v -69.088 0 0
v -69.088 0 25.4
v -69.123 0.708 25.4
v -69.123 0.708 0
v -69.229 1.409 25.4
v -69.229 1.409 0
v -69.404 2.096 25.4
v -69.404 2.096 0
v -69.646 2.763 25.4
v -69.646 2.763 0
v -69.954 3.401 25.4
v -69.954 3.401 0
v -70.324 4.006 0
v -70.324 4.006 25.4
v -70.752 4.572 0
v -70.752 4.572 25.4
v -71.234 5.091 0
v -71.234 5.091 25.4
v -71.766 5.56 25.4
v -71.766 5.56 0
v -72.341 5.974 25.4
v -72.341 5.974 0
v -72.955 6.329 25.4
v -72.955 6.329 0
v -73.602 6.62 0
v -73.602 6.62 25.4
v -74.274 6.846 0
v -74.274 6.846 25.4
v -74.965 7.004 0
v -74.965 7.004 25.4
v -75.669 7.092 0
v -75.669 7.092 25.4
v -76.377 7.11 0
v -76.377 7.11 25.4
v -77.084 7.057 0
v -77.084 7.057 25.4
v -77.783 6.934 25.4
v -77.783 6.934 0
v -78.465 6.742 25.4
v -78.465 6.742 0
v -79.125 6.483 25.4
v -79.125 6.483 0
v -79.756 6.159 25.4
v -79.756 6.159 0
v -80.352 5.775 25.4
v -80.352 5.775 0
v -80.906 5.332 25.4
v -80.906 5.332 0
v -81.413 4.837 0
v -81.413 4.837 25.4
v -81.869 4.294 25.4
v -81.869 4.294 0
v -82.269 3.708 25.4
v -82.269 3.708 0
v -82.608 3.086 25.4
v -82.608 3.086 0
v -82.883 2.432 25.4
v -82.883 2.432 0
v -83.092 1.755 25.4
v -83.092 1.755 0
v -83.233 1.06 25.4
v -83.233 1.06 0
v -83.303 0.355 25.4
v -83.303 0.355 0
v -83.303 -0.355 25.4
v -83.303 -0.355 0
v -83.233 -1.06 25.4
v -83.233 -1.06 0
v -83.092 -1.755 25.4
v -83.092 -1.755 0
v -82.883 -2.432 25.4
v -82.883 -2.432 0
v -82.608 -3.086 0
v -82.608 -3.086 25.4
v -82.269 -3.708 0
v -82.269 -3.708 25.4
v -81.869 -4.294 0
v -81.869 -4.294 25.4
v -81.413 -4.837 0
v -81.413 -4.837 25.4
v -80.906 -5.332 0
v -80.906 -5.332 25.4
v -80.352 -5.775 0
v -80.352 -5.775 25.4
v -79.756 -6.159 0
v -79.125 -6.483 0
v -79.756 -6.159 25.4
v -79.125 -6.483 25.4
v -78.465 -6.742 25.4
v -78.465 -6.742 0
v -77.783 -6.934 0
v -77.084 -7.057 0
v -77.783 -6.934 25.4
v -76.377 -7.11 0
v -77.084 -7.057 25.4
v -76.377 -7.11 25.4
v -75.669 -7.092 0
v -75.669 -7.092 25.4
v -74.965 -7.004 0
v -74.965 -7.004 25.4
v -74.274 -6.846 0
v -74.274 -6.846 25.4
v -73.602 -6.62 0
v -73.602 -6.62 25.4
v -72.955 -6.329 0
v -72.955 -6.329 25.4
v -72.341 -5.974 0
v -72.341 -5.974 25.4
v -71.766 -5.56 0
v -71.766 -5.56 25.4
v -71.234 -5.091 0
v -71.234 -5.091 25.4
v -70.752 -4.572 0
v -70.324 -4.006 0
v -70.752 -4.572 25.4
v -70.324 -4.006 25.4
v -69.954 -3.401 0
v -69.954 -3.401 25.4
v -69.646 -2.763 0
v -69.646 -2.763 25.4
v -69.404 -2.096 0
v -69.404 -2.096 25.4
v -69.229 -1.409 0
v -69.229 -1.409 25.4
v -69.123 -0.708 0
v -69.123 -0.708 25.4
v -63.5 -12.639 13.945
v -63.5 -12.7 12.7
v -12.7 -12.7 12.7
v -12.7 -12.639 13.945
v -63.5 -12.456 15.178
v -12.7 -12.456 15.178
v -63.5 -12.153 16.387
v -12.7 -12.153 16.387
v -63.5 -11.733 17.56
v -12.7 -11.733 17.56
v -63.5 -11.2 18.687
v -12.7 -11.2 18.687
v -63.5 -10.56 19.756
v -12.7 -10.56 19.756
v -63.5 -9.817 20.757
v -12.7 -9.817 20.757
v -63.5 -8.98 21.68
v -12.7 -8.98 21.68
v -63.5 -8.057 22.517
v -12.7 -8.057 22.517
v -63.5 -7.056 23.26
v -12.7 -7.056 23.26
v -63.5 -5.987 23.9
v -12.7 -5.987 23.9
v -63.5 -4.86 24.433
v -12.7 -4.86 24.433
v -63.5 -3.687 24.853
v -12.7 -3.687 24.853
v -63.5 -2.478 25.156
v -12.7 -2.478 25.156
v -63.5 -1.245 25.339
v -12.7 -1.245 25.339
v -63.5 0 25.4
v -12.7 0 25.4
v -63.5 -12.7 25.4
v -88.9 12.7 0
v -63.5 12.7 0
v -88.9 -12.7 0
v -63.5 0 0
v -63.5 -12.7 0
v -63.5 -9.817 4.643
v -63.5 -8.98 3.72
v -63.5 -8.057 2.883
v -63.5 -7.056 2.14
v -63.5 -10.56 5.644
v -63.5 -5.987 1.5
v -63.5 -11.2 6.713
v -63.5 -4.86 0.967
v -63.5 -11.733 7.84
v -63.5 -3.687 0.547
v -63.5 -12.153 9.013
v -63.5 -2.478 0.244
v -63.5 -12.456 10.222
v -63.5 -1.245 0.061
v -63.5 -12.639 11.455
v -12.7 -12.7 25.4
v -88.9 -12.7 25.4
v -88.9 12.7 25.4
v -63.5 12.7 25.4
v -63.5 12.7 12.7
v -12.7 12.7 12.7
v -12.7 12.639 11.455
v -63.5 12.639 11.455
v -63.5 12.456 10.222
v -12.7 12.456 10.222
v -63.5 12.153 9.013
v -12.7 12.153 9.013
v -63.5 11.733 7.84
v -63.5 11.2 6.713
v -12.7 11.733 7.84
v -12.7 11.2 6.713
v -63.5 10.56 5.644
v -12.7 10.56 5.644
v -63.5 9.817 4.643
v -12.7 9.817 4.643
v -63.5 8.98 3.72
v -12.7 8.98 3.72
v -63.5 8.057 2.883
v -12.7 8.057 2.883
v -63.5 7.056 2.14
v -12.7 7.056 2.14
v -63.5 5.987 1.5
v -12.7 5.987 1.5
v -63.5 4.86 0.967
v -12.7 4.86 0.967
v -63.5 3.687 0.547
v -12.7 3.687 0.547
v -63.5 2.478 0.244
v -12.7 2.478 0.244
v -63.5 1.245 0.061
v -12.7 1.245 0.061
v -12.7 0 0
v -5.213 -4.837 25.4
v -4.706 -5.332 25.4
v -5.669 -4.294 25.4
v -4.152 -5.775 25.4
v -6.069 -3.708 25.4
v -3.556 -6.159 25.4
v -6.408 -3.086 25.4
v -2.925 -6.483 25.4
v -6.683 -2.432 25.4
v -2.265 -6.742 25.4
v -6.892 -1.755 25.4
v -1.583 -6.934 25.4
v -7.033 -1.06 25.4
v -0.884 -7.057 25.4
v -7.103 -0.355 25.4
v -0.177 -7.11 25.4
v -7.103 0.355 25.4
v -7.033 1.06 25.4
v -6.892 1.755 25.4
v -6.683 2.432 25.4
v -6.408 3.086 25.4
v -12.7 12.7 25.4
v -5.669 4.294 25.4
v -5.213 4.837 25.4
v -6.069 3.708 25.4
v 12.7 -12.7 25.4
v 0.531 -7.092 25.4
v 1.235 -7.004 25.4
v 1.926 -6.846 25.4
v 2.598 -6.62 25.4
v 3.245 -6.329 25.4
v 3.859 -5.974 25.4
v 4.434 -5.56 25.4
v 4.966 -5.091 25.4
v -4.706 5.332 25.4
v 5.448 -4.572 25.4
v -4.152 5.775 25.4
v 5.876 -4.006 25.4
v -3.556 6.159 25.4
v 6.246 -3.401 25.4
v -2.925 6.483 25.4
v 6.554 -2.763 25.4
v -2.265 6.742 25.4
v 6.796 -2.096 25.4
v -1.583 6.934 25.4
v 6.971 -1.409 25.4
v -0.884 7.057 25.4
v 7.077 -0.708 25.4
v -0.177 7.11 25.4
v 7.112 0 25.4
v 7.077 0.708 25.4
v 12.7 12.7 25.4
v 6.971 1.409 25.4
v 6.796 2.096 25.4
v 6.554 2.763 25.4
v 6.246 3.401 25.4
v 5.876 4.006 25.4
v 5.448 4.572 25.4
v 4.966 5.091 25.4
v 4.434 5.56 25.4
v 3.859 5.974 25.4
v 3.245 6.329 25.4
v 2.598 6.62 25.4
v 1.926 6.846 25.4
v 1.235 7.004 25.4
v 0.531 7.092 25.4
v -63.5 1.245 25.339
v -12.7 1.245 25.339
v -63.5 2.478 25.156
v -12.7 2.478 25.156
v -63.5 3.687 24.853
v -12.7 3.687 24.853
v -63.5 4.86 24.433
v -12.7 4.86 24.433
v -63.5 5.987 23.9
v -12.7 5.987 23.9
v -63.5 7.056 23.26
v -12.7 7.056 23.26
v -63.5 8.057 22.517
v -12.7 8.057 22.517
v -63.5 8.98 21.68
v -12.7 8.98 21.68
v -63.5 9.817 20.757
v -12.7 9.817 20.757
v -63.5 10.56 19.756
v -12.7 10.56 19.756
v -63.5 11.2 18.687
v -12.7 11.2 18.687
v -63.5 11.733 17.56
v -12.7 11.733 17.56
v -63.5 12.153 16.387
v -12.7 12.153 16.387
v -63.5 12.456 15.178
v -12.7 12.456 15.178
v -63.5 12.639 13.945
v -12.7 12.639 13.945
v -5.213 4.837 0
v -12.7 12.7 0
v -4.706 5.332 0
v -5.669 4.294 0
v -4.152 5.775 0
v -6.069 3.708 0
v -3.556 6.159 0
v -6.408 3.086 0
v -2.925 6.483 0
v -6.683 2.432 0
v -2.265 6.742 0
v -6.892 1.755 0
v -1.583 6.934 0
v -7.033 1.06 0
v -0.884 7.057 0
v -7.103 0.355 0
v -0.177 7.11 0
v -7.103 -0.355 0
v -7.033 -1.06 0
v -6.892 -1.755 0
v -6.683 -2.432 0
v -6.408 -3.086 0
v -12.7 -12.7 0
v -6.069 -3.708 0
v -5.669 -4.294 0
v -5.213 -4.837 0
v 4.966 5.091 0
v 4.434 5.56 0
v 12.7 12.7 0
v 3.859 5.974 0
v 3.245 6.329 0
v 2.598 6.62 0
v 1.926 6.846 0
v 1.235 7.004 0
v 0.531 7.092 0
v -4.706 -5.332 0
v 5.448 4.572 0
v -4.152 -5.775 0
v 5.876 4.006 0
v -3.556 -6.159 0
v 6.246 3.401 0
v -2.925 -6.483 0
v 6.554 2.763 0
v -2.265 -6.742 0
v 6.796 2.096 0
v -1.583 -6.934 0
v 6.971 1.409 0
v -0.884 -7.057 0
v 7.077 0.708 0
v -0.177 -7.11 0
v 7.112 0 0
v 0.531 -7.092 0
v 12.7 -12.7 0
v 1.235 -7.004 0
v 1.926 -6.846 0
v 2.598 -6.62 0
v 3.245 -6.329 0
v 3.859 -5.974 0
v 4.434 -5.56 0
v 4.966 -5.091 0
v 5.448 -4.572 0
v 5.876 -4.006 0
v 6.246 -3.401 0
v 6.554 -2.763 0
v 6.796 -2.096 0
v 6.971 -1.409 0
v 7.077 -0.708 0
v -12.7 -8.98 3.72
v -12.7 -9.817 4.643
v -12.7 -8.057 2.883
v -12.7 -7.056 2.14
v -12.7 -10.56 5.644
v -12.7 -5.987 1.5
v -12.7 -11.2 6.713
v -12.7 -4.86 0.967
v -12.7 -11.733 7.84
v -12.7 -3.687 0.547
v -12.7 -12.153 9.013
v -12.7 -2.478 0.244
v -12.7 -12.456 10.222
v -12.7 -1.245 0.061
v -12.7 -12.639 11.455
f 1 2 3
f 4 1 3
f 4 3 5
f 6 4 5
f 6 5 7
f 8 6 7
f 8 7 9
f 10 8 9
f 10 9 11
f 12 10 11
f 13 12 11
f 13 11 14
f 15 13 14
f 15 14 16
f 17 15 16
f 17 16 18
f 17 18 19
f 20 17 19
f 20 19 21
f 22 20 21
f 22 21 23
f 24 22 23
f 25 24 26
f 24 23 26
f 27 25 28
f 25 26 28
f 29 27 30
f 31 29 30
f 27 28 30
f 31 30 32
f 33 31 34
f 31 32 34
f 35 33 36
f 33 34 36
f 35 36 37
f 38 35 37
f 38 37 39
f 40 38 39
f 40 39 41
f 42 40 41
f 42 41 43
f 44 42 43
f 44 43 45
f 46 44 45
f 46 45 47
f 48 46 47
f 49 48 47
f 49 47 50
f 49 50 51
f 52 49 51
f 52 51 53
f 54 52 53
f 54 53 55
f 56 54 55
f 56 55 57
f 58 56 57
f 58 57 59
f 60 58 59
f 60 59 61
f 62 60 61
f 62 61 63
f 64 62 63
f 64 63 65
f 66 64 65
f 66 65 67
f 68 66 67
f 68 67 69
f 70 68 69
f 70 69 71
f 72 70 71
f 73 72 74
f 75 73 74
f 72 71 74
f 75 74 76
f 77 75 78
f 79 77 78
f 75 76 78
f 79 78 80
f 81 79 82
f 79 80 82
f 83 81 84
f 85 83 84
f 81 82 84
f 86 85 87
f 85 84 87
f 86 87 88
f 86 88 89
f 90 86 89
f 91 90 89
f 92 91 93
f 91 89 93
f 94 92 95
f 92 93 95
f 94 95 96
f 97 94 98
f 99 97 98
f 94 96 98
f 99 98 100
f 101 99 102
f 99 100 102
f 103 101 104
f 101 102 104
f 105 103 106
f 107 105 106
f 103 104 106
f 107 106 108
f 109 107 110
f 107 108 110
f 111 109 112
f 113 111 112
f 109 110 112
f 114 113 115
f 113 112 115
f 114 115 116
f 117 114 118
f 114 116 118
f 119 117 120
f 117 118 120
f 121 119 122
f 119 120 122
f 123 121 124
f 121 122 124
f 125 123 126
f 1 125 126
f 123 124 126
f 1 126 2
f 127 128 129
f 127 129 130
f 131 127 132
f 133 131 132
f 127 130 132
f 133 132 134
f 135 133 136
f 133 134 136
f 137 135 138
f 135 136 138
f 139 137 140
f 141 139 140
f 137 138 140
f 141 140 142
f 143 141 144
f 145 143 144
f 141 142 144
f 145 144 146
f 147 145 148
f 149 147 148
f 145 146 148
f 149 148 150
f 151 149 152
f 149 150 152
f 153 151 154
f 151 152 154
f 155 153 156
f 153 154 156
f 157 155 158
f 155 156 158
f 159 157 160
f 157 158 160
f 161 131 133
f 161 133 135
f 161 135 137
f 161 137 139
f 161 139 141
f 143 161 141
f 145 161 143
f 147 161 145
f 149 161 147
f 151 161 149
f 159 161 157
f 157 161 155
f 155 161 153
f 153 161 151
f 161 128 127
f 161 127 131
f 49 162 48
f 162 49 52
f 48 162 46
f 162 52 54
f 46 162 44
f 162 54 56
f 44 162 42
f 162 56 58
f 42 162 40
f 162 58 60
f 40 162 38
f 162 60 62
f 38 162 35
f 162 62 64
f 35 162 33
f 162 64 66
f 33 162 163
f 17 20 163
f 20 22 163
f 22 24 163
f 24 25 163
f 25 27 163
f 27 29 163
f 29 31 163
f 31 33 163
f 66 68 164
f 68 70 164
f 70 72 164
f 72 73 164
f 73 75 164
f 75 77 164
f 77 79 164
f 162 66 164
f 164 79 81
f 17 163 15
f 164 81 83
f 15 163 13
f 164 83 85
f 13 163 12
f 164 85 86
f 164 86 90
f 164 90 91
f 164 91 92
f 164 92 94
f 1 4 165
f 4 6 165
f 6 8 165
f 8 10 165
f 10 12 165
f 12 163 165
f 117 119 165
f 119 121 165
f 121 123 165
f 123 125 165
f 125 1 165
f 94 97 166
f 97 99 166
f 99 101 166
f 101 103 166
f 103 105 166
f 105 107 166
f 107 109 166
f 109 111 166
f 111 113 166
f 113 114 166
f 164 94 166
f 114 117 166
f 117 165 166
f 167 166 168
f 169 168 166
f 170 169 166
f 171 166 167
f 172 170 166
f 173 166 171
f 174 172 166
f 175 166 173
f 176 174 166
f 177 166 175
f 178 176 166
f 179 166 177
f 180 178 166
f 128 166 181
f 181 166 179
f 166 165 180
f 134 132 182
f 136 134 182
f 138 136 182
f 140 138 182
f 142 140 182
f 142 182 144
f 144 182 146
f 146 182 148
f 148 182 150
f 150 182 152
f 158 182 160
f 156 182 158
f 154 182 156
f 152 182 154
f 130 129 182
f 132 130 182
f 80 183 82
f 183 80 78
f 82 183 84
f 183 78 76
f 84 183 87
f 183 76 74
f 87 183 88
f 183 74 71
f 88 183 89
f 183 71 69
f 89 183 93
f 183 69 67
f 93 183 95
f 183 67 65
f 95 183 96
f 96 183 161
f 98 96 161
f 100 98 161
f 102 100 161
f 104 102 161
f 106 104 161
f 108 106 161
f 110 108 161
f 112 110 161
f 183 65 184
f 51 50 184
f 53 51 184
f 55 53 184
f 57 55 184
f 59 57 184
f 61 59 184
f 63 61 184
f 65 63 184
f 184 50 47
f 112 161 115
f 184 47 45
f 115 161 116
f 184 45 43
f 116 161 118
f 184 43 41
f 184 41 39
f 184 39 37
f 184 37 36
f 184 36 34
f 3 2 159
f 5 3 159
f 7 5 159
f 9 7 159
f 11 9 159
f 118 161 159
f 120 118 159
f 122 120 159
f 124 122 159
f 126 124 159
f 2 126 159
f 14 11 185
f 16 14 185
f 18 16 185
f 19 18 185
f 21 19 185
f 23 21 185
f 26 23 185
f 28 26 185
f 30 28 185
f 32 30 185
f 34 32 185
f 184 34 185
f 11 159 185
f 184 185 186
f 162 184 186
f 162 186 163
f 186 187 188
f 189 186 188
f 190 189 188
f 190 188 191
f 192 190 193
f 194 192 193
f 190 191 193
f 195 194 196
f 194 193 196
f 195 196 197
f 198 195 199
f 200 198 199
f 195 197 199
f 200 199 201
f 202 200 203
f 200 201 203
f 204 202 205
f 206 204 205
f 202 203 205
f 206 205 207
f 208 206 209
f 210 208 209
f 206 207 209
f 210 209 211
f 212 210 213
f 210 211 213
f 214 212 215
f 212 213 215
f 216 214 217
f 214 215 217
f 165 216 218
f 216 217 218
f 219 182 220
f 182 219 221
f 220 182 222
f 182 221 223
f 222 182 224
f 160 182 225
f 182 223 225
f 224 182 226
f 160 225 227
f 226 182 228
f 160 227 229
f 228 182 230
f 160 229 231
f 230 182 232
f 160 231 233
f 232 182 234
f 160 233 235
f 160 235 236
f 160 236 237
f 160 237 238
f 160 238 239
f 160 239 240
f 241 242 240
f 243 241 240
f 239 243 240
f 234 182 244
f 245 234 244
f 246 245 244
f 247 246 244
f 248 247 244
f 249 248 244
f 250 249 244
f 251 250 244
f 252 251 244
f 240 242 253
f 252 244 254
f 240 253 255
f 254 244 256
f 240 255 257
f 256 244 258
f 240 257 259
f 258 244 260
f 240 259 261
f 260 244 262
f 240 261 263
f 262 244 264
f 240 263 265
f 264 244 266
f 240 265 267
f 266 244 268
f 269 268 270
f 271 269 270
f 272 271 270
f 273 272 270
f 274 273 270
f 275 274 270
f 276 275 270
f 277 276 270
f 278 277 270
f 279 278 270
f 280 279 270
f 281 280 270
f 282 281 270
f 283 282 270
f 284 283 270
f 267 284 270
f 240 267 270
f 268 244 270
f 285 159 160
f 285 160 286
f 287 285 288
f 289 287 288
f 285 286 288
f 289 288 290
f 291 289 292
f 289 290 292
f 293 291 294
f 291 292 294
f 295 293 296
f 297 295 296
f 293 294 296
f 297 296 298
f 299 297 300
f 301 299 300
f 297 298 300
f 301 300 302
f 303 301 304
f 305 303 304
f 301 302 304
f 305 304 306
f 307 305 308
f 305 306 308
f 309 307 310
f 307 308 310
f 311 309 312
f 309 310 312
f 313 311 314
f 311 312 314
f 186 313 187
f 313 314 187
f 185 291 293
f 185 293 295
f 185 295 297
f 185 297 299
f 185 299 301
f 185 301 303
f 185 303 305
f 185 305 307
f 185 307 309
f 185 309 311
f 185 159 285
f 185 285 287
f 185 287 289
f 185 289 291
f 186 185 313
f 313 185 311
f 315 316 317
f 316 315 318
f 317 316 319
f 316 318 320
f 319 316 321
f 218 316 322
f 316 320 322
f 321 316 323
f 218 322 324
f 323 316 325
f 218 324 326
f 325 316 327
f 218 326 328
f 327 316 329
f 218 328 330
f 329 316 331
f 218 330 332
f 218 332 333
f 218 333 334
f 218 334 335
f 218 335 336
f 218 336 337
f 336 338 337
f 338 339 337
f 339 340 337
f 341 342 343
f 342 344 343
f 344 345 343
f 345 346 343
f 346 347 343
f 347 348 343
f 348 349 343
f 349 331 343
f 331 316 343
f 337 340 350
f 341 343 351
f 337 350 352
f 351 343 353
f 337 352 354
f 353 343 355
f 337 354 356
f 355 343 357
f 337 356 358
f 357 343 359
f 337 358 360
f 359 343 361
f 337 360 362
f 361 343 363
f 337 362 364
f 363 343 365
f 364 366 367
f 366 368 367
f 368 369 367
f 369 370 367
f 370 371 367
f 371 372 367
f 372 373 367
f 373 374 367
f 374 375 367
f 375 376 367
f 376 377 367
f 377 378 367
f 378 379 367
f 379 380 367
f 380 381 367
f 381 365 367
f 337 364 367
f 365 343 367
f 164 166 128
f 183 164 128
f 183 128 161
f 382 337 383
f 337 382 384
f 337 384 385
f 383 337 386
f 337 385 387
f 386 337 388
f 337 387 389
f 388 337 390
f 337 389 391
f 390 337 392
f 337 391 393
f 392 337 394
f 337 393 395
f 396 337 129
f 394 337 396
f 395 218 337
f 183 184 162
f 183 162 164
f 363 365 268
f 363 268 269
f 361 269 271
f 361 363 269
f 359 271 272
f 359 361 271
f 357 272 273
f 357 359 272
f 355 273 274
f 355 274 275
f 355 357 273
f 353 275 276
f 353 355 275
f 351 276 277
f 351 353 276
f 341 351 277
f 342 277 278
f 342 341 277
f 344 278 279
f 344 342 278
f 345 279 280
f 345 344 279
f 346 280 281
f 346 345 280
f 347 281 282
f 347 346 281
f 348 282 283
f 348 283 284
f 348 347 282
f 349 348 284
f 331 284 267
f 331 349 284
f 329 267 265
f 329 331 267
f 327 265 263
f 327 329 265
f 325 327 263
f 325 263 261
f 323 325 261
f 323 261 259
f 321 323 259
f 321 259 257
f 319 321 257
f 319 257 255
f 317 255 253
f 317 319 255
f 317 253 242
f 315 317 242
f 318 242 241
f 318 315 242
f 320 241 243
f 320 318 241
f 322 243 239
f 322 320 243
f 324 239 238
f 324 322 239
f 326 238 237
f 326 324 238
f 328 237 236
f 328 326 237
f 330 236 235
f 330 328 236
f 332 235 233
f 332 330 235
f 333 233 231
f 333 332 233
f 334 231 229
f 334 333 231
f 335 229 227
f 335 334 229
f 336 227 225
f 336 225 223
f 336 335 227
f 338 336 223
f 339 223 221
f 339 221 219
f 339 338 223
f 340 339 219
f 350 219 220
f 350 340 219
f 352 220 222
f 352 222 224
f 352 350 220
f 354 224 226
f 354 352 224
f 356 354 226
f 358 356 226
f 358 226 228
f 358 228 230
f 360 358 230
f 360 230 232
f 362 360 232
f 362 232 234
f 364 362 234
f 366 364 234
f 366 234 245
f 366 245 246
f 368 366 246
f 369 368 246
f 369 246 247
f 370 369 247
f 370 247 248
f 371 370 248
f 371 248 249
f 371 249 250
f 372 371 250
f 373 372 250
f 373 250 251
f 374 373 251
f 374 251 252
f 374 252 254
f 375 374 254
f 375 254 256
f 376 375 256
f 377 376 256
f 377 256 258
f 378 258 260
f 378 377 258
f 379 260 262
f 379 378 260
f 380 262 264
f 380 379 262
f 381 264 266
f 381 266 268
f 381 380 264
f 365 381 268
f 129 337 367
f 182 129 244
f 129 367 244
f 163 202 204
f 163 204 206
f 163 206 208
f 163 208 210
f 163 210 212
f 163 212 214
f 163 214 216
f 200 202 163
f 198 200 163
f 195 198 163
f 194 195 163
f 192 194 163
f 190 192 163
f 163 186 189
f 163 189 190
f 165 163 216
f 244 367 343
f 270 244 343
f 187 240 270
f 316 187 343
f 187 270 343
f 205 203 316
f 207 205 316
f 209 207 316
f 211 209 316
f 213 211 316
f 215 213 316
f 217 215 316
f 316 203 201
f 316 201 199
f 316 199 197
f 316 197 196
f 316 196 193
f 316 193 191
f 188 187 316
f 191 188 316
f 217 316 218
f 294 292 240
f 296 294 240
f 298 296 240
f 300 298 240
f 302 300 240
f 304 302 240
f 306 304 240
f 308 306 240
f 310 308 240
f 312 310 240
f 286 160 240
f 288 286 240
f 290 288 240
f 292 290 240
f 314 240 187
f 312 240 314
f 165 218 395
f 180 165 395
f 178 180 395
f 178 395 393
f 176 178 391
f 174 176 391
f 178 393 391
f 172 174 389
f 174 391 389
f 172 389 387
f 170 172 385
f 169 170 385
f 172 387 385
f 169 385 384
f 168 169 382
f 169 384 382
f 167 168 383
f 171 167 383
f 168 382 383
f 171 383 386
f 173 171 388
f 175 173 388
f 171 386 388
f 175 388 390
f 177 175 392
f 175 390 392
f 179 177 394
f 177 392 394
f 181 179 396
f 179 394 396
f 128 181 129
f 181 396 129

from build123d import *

# Parameters (mm, degrees)
F0_W     = 25.4
F0_H     = 25.4
F0_R     = 7.112
F1_DEPTH = 25.4
F3_DEPTH = 76.2
F4_R     = 7.112
F4_W     = 50.8
F4_H     = 25.4
F5_DEPTH = 25.401
F6_DEPTH = 50.8
F7_R     = 7.112
F8_DEPTH = 148


# Not quite as in the source:
# - an extrude ends at something that could not be found from the text; its depth is read off the source's solid


with BuildPart() as f1:
    # F0 (on Top) → F1 (new body)
    with BuildSketch(Plane.XY):
        Rectangle(F0_W, F0_H)
        Circle(F0_R, mode=Mode.SUBTRACT)
    extrude(amount=F1_DEPTH)

    # F2 (on face) → F3 (join)
    with BuildSketch(Plane(origin=(-12.7, 0, 0), x_dir=(0, -1, 0), z_dir=(-1, 0, 0))):
        with BuildLine():
            ThreePointArc((-12.7, 12.7), (-8.9802561211, 21.6802561211), (0, 25.4))
            Line((0, 25.4), (-12.7, 25.4))
            Line((-12.7, 25.4), (-12.7, 12.7))
        make_face()
        with BuildLine():
            ThreePointArc((0, 25.4), (8.9802561211, 21.6802561211), (12.7, 12.7))
            Line((12.7, 12.7), (12.7, 25.4))
            Line((12.7, 25.4), (0, 25.4))
        make_face()
        with BuildLine():
            Line((12.7, 0), (12.7, 12.7))
            ThreePointArc((12.7, 12.7), (8.9802561211, 3.7197438789), (0, 0))
            Line((0, 0), (12.7, 0))
        make_face()
        with BuildLine():
            Line((-12.7, 0), (0, 0))
            ThreePointArc((0, 0), (-8.9802561211, 3.7197438789), (-12.7, 12.7))
            Line((-12.7, 12.7), (-12.7, 0))
        make_face()
        with BuildLine():
            ThreePointArc((0, 0), (8.9802561211, 3.7197438789), (12.7, 12.7))
            ThreePointArc((12.7, 12.7), (8.9802561211, 21.6802561211), (0, 25.4))
            ThreePointArc((0, 25.4), (-8.9802561211, 21.6802561211), (-12.7, 12.7))
            ThreePointArc((-12.7, 12.7), (-8.9802561211, 3.7197438789), (0, 0))
        make_face()
    extrude(amount=F3_DEPTH)

    # F4 (on face) → F5 (cut, through all)
    with BuildSketch(Plane.XY.offset(25.4)):
        with Locations((-76.2, 0)):
            Circle(F4_R)
        with Locations((-38.1, 0)):
            Rectangle(F4_W, F4_H)
    extrude(amount=-F5_DEPTH, mode=Mode.SUBTRACT)

    # F2 (on face) → F6 (join, through all)
    with BuildSketch(Plane(origin=(-12.7, 0, 0), x_dir=(0, -1, 0), z_dir=(-1, 0, 0))):
        with BuildLine():
            ThreePointArc((0, 0), (8.9802561211, 3.7197438789), (12.7, 12.7))
            ThreePointArc((12.7, 12.7), (8.9802561211, 21.6802561211), (0, 25.4))
            ThreePointArc((0, 25.4), (-8.9802561211, 21.6802561211), (-12.7, 12.7))
            ThreePointArc((-12.7, 12.7), (-8.9802561211, 3.7197438789), (0, 0))
        make_face()
    extrude(amount=F6_DEPTH)

    # F7 (on face) → F8 (cut, through all)
    with BuildSketch(Plane(origin=(0, 0, 0), x_dir=(1, 0, 0), z_dir=(0, 0, -1))):
        Polygon((-63.5, 0), (-63.5, 12.7), (-88.9, 12.7), (-88.9, -12.7), (-63.5, -12.7), align=None)
        with Locations((-76.2, 0)):
            Circle(F7_R, mode=Mode.SUBTRACT)
    extrude(amount=F8_DEPTH, mode=Mode.SUBTRACT)


solid = f1.part
